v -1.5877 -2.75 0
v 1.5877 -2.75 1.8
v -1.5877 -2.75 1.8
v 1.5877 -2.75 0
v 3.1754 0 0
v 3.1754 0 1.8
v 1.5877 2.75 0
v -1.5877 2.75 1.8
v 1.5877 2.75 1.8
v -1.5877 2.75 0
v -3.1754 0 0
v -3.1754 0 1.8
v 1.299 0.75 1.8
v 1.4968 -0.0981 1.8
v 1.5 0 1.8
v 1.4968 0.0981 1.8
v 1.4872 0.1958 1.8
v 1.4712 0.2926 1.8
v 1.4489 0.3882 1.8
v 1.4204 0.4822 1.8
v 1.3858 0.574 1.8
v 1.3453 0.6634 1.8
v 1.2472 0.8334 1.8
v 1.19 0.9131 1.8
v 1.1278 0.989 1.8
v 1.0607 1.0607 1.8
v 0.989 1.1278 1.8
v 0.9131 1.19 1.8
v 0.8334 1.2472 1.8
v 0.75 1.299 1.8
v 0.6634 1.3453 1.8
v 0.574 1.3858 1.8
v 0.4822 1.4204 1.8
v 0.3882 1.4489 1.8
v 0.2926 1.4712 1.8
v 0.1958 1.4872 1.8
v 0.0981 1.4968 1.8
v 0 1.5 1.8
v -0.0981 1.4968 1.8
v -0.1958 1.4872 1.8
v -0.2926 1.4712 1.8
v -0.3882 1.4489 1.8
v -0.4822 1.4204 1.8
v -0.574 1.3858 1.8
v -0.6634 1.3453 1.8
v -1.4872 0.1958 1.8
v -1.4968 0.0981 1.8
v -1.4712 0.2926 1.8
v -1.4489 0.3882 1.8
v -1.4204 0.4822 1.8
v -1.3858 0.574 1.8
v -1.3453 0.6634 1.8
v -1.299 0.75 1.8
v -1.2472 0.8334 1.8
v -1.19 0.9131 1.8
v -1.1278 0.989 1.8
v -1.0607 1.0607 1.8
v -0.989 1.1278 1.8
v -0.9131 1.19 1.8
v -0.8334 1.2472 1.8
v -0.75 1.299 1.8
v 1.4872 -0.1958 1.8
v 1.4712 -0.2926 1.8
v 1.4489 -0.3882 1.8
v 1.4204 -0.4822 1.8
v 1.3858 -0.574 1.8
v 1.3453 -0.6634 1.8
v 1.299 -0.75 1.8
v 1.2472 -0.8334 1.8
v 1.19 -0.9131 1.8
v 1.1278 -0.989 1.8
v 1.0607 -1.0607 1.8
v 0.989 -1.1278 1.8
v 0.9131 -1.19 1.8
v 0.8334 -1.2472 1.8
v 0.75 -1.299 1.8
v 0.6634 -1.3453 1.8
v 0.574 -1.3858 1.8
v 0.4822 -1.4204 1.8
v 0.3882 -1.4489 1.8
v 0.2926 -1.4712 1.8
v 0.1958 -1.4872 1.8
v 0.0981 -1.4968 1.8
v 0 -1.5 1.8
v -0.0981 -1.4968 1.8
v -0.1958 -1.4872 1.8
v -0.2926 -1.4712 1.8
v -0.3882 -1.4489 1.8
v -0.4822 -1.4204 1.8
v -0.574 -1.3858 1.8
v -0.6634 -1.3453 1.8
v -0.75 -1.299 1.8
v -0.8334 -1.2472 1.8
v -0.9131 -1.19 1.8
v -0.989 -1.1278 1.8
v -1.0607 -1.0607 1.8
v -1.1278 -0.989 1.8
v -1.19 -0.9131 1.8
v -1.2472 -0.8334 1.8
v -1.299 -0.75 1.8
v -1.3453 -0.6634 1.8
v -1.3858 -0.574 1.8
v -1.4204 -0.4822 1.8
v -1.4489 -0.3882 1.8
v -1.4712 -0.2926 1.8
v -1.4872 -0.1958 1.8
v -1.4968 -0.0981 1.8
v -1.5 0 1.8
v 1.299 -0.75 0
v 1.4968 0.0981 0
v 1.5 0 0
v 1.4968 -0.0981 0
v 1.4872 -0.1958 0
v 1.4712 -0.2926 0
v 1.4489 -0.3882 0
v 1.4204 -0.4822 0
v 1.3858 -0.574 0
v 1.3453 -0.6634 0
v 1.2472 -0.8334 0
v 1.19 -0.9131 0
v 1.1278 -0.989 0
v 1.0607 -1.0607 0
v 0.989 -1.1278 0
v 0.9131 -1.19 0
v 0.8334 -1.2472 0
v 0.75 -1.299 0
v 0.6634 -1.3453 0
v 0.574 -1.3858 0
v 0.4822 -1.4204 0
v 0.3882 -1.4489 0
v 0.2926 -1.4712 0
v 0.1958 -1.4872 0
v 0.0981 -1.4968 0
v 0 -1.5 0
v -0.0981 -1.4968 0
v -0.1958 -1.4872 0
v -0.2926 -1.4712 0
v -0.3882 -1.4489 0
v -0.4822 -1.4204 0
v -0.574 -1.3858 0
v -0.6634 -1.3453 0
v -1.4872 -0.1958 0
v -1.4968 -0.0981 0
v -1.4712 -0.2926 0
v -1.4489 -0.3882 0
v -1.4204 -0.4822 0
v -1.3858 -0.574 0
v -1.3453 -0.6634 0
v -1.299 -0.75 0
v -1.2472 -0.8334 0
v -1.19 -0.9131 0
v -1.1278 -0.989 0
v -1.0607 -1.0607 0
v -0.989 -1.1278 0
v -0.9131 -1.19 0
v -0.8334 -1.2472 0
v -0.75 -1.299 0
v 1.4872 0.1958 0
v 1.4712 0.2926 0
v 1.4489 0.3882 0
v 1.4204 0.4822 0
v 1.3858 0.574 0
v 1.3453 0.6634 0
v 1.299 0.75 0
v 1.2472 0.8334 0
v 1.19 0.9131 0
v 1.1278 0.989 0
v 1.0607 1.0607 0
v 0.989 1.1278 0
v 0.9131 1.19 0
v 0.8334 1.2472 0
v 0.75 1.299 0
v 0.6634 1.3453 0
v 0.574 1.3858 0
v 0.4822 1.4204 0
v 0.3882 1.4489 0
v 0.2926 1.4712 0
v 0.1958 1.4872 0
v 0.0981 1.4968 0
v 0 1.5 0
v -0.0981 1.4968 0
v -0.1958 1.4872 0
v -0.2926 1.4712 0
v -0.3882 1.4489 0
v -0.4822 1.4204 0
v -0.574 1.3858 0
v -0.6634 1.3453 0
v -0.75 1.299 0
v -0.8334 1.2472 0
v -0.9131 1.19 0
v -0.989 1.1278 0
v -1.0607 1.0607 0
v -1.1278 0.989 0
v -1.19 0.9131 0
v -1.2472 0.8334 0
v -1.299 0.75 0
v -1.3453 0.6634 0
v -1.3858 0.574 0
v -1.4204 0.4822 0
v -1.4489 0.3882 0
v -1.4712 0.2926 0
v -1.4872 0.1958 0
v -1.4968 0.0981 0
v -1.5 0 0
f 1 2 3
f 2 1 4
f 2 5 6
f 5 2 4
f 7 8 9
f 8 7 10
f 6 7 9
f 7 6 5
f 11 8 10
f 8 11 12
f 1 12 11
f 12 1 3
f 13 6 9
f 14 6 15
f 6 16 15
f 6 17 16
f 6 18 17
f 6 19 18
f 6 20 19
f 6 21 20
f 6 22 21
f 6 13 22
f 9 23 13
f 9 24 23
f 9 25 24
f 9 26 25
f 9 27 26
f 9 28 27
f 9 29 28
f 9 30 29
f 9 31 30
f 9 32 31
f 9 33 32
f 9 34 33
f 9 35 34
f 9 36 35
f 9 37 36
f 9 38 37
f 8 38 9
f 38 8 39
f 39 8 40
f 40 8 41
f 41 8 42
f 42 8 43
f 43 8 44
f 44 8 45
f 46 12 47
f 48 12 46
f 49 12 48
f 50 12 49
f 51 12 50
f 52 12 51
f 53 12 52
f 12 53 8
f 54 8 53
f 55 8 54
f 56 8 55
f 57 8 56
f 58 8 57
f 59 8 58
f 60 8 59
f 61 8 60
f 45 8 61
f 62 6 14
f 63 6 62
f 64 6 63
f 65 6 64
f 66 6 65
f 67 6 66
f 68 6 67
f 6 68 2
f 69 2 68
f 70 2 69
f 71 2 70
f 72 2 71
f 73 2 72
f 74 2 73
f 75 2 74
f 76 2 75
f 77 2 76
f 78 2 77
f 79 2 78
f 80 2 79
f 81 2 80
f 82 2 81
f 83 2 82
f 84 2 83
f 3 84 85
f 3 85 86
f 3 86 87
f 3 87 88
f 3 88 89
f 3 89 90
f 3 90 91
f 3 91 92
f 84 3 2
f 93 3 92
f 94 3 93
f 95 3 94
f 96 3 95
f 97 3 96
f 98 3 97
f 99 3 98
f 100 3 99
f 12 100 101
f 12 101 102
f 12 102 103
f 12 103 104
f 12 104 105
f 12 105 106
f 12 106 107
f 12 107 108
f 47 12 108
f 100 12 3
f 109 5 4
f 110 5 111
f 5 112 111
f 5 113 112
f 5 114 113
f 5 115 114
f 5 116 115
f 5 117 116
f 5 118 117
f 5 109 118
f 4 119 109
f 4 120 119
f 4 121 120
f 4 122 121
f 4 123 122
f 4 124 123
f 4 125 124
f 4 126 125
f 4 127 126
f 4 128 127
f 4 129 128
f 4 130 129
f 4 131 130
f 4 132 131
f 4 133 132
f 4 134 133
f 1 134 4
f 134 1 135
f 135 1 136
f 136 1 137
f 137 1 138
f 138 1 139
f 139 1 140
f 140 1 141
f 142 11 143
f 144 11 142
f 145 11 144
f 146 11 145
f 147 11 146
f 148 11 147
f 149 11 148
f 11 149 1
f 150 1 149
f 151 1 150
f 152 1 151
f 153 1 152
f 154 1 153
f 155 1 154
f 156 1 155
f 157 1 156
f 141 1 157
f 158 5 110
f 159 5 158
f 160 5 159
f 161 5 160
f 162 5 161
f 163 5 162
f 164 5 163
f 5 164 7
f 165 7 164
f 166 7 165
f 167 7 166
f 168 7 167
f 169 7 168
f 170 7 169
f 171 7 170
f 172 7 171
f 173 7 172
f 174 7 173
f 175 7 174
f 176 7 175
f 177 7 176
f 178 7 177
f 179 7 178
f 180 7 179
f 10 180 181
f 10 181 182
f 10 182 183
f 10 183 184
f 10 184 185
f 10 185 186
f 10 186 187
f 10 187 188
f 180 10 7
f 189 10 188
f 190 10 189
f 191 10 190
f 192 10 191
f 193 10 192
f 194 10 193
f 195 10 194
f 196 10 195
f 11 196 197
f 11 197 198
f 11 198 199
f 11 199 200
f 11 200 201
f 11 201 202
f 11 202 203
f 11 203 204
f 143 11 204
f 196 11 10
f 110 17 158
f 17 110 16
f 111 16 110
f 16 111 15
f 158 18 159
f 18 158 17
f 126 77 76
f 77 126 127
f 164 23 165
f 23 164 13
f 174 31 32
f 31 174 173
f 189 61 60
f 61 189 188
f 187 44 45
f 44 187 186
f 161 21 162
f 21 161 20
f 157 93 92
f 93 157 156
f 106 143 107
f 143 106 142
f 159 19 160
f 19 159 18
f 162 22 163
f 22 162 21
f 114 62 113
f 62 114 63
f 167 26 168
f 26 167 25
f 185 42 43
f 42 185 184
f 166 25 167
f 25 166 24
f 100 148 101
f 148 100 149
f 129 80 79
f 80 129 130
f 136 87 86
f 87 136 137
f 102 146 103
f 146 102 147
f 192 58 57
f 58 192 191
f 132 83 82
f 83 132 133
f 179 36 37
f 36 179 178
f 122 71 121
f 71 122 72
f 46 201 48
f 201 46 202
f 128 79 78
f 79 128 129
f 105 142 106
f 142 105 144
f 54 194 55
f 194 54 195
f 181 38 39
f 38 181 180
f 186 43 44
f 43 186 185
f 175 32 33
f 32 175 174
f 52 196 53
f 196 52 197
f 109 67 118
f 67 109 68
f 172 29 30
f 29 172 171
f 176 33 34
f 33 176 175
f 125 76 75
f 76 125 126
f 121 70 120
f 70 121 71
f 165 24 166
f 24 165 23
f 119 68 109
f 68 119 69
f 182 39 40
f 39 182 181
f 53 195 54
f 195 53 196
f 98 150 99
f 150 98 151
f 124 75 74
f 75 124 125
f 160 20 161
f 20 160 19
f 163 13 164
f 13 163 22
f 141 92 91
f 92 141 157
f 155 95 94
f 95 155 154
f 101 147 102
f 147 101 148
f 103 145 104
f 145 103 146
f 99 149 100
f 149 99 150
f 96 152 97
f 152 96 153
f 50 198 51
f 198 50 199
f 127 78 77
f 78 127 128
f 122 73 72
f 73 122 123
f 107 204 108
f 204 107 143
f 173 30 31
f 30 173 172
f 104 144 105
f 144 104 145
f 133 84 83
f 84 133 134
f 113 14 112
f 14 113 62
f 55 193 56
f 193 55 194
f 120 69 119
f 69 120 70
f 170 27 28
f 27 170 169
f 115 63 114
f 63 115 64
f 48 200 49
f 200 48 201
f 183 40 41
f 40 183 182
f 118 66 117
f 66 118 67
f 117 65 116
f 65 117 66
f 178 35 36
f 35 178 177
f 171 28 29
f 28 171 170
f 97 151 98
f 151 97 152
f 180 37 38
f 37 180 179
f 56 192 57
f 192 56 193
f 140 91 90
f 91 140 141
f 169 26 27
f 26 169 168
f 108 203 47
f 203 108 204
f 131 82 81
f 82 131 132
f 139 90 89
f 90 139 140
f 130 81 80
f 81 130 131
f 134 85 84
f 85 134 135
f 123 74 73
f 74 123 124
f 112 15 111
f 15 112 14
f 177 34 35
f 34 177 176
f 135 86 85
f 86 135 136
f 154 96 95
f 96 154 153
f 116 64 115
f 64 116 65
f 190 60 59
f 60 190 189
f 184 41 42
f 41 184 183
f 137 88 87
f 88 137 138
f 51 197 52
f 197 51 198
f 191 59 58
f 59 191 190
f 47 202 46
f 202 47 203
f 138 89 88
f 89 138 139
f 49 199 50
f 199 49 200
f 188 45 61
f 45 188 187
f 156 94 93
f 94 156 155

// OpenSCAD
$fn = 96;

across_flats = 5.5;   // mm
thickness    = 1.8;   // mm
hole_d       = 3.0;   // mm (clearance as specified)

module hex_prism_af(af, h){
    // For a regular hexagon: across_flats = 2 * apothem
    // Circumradius R = apothem / cos(30°) = (af/2) / cos(30°)
    R = (af/2) / cos(30);
    cylinder(h=h, r=R, $fn=6);
}

difference() {
    hex_prism_af(across_flats, thickness);
    translate([0,0,-0.2])
        cylinder(h=thickness+0.4, d=hole_d, $fn=96);
}
